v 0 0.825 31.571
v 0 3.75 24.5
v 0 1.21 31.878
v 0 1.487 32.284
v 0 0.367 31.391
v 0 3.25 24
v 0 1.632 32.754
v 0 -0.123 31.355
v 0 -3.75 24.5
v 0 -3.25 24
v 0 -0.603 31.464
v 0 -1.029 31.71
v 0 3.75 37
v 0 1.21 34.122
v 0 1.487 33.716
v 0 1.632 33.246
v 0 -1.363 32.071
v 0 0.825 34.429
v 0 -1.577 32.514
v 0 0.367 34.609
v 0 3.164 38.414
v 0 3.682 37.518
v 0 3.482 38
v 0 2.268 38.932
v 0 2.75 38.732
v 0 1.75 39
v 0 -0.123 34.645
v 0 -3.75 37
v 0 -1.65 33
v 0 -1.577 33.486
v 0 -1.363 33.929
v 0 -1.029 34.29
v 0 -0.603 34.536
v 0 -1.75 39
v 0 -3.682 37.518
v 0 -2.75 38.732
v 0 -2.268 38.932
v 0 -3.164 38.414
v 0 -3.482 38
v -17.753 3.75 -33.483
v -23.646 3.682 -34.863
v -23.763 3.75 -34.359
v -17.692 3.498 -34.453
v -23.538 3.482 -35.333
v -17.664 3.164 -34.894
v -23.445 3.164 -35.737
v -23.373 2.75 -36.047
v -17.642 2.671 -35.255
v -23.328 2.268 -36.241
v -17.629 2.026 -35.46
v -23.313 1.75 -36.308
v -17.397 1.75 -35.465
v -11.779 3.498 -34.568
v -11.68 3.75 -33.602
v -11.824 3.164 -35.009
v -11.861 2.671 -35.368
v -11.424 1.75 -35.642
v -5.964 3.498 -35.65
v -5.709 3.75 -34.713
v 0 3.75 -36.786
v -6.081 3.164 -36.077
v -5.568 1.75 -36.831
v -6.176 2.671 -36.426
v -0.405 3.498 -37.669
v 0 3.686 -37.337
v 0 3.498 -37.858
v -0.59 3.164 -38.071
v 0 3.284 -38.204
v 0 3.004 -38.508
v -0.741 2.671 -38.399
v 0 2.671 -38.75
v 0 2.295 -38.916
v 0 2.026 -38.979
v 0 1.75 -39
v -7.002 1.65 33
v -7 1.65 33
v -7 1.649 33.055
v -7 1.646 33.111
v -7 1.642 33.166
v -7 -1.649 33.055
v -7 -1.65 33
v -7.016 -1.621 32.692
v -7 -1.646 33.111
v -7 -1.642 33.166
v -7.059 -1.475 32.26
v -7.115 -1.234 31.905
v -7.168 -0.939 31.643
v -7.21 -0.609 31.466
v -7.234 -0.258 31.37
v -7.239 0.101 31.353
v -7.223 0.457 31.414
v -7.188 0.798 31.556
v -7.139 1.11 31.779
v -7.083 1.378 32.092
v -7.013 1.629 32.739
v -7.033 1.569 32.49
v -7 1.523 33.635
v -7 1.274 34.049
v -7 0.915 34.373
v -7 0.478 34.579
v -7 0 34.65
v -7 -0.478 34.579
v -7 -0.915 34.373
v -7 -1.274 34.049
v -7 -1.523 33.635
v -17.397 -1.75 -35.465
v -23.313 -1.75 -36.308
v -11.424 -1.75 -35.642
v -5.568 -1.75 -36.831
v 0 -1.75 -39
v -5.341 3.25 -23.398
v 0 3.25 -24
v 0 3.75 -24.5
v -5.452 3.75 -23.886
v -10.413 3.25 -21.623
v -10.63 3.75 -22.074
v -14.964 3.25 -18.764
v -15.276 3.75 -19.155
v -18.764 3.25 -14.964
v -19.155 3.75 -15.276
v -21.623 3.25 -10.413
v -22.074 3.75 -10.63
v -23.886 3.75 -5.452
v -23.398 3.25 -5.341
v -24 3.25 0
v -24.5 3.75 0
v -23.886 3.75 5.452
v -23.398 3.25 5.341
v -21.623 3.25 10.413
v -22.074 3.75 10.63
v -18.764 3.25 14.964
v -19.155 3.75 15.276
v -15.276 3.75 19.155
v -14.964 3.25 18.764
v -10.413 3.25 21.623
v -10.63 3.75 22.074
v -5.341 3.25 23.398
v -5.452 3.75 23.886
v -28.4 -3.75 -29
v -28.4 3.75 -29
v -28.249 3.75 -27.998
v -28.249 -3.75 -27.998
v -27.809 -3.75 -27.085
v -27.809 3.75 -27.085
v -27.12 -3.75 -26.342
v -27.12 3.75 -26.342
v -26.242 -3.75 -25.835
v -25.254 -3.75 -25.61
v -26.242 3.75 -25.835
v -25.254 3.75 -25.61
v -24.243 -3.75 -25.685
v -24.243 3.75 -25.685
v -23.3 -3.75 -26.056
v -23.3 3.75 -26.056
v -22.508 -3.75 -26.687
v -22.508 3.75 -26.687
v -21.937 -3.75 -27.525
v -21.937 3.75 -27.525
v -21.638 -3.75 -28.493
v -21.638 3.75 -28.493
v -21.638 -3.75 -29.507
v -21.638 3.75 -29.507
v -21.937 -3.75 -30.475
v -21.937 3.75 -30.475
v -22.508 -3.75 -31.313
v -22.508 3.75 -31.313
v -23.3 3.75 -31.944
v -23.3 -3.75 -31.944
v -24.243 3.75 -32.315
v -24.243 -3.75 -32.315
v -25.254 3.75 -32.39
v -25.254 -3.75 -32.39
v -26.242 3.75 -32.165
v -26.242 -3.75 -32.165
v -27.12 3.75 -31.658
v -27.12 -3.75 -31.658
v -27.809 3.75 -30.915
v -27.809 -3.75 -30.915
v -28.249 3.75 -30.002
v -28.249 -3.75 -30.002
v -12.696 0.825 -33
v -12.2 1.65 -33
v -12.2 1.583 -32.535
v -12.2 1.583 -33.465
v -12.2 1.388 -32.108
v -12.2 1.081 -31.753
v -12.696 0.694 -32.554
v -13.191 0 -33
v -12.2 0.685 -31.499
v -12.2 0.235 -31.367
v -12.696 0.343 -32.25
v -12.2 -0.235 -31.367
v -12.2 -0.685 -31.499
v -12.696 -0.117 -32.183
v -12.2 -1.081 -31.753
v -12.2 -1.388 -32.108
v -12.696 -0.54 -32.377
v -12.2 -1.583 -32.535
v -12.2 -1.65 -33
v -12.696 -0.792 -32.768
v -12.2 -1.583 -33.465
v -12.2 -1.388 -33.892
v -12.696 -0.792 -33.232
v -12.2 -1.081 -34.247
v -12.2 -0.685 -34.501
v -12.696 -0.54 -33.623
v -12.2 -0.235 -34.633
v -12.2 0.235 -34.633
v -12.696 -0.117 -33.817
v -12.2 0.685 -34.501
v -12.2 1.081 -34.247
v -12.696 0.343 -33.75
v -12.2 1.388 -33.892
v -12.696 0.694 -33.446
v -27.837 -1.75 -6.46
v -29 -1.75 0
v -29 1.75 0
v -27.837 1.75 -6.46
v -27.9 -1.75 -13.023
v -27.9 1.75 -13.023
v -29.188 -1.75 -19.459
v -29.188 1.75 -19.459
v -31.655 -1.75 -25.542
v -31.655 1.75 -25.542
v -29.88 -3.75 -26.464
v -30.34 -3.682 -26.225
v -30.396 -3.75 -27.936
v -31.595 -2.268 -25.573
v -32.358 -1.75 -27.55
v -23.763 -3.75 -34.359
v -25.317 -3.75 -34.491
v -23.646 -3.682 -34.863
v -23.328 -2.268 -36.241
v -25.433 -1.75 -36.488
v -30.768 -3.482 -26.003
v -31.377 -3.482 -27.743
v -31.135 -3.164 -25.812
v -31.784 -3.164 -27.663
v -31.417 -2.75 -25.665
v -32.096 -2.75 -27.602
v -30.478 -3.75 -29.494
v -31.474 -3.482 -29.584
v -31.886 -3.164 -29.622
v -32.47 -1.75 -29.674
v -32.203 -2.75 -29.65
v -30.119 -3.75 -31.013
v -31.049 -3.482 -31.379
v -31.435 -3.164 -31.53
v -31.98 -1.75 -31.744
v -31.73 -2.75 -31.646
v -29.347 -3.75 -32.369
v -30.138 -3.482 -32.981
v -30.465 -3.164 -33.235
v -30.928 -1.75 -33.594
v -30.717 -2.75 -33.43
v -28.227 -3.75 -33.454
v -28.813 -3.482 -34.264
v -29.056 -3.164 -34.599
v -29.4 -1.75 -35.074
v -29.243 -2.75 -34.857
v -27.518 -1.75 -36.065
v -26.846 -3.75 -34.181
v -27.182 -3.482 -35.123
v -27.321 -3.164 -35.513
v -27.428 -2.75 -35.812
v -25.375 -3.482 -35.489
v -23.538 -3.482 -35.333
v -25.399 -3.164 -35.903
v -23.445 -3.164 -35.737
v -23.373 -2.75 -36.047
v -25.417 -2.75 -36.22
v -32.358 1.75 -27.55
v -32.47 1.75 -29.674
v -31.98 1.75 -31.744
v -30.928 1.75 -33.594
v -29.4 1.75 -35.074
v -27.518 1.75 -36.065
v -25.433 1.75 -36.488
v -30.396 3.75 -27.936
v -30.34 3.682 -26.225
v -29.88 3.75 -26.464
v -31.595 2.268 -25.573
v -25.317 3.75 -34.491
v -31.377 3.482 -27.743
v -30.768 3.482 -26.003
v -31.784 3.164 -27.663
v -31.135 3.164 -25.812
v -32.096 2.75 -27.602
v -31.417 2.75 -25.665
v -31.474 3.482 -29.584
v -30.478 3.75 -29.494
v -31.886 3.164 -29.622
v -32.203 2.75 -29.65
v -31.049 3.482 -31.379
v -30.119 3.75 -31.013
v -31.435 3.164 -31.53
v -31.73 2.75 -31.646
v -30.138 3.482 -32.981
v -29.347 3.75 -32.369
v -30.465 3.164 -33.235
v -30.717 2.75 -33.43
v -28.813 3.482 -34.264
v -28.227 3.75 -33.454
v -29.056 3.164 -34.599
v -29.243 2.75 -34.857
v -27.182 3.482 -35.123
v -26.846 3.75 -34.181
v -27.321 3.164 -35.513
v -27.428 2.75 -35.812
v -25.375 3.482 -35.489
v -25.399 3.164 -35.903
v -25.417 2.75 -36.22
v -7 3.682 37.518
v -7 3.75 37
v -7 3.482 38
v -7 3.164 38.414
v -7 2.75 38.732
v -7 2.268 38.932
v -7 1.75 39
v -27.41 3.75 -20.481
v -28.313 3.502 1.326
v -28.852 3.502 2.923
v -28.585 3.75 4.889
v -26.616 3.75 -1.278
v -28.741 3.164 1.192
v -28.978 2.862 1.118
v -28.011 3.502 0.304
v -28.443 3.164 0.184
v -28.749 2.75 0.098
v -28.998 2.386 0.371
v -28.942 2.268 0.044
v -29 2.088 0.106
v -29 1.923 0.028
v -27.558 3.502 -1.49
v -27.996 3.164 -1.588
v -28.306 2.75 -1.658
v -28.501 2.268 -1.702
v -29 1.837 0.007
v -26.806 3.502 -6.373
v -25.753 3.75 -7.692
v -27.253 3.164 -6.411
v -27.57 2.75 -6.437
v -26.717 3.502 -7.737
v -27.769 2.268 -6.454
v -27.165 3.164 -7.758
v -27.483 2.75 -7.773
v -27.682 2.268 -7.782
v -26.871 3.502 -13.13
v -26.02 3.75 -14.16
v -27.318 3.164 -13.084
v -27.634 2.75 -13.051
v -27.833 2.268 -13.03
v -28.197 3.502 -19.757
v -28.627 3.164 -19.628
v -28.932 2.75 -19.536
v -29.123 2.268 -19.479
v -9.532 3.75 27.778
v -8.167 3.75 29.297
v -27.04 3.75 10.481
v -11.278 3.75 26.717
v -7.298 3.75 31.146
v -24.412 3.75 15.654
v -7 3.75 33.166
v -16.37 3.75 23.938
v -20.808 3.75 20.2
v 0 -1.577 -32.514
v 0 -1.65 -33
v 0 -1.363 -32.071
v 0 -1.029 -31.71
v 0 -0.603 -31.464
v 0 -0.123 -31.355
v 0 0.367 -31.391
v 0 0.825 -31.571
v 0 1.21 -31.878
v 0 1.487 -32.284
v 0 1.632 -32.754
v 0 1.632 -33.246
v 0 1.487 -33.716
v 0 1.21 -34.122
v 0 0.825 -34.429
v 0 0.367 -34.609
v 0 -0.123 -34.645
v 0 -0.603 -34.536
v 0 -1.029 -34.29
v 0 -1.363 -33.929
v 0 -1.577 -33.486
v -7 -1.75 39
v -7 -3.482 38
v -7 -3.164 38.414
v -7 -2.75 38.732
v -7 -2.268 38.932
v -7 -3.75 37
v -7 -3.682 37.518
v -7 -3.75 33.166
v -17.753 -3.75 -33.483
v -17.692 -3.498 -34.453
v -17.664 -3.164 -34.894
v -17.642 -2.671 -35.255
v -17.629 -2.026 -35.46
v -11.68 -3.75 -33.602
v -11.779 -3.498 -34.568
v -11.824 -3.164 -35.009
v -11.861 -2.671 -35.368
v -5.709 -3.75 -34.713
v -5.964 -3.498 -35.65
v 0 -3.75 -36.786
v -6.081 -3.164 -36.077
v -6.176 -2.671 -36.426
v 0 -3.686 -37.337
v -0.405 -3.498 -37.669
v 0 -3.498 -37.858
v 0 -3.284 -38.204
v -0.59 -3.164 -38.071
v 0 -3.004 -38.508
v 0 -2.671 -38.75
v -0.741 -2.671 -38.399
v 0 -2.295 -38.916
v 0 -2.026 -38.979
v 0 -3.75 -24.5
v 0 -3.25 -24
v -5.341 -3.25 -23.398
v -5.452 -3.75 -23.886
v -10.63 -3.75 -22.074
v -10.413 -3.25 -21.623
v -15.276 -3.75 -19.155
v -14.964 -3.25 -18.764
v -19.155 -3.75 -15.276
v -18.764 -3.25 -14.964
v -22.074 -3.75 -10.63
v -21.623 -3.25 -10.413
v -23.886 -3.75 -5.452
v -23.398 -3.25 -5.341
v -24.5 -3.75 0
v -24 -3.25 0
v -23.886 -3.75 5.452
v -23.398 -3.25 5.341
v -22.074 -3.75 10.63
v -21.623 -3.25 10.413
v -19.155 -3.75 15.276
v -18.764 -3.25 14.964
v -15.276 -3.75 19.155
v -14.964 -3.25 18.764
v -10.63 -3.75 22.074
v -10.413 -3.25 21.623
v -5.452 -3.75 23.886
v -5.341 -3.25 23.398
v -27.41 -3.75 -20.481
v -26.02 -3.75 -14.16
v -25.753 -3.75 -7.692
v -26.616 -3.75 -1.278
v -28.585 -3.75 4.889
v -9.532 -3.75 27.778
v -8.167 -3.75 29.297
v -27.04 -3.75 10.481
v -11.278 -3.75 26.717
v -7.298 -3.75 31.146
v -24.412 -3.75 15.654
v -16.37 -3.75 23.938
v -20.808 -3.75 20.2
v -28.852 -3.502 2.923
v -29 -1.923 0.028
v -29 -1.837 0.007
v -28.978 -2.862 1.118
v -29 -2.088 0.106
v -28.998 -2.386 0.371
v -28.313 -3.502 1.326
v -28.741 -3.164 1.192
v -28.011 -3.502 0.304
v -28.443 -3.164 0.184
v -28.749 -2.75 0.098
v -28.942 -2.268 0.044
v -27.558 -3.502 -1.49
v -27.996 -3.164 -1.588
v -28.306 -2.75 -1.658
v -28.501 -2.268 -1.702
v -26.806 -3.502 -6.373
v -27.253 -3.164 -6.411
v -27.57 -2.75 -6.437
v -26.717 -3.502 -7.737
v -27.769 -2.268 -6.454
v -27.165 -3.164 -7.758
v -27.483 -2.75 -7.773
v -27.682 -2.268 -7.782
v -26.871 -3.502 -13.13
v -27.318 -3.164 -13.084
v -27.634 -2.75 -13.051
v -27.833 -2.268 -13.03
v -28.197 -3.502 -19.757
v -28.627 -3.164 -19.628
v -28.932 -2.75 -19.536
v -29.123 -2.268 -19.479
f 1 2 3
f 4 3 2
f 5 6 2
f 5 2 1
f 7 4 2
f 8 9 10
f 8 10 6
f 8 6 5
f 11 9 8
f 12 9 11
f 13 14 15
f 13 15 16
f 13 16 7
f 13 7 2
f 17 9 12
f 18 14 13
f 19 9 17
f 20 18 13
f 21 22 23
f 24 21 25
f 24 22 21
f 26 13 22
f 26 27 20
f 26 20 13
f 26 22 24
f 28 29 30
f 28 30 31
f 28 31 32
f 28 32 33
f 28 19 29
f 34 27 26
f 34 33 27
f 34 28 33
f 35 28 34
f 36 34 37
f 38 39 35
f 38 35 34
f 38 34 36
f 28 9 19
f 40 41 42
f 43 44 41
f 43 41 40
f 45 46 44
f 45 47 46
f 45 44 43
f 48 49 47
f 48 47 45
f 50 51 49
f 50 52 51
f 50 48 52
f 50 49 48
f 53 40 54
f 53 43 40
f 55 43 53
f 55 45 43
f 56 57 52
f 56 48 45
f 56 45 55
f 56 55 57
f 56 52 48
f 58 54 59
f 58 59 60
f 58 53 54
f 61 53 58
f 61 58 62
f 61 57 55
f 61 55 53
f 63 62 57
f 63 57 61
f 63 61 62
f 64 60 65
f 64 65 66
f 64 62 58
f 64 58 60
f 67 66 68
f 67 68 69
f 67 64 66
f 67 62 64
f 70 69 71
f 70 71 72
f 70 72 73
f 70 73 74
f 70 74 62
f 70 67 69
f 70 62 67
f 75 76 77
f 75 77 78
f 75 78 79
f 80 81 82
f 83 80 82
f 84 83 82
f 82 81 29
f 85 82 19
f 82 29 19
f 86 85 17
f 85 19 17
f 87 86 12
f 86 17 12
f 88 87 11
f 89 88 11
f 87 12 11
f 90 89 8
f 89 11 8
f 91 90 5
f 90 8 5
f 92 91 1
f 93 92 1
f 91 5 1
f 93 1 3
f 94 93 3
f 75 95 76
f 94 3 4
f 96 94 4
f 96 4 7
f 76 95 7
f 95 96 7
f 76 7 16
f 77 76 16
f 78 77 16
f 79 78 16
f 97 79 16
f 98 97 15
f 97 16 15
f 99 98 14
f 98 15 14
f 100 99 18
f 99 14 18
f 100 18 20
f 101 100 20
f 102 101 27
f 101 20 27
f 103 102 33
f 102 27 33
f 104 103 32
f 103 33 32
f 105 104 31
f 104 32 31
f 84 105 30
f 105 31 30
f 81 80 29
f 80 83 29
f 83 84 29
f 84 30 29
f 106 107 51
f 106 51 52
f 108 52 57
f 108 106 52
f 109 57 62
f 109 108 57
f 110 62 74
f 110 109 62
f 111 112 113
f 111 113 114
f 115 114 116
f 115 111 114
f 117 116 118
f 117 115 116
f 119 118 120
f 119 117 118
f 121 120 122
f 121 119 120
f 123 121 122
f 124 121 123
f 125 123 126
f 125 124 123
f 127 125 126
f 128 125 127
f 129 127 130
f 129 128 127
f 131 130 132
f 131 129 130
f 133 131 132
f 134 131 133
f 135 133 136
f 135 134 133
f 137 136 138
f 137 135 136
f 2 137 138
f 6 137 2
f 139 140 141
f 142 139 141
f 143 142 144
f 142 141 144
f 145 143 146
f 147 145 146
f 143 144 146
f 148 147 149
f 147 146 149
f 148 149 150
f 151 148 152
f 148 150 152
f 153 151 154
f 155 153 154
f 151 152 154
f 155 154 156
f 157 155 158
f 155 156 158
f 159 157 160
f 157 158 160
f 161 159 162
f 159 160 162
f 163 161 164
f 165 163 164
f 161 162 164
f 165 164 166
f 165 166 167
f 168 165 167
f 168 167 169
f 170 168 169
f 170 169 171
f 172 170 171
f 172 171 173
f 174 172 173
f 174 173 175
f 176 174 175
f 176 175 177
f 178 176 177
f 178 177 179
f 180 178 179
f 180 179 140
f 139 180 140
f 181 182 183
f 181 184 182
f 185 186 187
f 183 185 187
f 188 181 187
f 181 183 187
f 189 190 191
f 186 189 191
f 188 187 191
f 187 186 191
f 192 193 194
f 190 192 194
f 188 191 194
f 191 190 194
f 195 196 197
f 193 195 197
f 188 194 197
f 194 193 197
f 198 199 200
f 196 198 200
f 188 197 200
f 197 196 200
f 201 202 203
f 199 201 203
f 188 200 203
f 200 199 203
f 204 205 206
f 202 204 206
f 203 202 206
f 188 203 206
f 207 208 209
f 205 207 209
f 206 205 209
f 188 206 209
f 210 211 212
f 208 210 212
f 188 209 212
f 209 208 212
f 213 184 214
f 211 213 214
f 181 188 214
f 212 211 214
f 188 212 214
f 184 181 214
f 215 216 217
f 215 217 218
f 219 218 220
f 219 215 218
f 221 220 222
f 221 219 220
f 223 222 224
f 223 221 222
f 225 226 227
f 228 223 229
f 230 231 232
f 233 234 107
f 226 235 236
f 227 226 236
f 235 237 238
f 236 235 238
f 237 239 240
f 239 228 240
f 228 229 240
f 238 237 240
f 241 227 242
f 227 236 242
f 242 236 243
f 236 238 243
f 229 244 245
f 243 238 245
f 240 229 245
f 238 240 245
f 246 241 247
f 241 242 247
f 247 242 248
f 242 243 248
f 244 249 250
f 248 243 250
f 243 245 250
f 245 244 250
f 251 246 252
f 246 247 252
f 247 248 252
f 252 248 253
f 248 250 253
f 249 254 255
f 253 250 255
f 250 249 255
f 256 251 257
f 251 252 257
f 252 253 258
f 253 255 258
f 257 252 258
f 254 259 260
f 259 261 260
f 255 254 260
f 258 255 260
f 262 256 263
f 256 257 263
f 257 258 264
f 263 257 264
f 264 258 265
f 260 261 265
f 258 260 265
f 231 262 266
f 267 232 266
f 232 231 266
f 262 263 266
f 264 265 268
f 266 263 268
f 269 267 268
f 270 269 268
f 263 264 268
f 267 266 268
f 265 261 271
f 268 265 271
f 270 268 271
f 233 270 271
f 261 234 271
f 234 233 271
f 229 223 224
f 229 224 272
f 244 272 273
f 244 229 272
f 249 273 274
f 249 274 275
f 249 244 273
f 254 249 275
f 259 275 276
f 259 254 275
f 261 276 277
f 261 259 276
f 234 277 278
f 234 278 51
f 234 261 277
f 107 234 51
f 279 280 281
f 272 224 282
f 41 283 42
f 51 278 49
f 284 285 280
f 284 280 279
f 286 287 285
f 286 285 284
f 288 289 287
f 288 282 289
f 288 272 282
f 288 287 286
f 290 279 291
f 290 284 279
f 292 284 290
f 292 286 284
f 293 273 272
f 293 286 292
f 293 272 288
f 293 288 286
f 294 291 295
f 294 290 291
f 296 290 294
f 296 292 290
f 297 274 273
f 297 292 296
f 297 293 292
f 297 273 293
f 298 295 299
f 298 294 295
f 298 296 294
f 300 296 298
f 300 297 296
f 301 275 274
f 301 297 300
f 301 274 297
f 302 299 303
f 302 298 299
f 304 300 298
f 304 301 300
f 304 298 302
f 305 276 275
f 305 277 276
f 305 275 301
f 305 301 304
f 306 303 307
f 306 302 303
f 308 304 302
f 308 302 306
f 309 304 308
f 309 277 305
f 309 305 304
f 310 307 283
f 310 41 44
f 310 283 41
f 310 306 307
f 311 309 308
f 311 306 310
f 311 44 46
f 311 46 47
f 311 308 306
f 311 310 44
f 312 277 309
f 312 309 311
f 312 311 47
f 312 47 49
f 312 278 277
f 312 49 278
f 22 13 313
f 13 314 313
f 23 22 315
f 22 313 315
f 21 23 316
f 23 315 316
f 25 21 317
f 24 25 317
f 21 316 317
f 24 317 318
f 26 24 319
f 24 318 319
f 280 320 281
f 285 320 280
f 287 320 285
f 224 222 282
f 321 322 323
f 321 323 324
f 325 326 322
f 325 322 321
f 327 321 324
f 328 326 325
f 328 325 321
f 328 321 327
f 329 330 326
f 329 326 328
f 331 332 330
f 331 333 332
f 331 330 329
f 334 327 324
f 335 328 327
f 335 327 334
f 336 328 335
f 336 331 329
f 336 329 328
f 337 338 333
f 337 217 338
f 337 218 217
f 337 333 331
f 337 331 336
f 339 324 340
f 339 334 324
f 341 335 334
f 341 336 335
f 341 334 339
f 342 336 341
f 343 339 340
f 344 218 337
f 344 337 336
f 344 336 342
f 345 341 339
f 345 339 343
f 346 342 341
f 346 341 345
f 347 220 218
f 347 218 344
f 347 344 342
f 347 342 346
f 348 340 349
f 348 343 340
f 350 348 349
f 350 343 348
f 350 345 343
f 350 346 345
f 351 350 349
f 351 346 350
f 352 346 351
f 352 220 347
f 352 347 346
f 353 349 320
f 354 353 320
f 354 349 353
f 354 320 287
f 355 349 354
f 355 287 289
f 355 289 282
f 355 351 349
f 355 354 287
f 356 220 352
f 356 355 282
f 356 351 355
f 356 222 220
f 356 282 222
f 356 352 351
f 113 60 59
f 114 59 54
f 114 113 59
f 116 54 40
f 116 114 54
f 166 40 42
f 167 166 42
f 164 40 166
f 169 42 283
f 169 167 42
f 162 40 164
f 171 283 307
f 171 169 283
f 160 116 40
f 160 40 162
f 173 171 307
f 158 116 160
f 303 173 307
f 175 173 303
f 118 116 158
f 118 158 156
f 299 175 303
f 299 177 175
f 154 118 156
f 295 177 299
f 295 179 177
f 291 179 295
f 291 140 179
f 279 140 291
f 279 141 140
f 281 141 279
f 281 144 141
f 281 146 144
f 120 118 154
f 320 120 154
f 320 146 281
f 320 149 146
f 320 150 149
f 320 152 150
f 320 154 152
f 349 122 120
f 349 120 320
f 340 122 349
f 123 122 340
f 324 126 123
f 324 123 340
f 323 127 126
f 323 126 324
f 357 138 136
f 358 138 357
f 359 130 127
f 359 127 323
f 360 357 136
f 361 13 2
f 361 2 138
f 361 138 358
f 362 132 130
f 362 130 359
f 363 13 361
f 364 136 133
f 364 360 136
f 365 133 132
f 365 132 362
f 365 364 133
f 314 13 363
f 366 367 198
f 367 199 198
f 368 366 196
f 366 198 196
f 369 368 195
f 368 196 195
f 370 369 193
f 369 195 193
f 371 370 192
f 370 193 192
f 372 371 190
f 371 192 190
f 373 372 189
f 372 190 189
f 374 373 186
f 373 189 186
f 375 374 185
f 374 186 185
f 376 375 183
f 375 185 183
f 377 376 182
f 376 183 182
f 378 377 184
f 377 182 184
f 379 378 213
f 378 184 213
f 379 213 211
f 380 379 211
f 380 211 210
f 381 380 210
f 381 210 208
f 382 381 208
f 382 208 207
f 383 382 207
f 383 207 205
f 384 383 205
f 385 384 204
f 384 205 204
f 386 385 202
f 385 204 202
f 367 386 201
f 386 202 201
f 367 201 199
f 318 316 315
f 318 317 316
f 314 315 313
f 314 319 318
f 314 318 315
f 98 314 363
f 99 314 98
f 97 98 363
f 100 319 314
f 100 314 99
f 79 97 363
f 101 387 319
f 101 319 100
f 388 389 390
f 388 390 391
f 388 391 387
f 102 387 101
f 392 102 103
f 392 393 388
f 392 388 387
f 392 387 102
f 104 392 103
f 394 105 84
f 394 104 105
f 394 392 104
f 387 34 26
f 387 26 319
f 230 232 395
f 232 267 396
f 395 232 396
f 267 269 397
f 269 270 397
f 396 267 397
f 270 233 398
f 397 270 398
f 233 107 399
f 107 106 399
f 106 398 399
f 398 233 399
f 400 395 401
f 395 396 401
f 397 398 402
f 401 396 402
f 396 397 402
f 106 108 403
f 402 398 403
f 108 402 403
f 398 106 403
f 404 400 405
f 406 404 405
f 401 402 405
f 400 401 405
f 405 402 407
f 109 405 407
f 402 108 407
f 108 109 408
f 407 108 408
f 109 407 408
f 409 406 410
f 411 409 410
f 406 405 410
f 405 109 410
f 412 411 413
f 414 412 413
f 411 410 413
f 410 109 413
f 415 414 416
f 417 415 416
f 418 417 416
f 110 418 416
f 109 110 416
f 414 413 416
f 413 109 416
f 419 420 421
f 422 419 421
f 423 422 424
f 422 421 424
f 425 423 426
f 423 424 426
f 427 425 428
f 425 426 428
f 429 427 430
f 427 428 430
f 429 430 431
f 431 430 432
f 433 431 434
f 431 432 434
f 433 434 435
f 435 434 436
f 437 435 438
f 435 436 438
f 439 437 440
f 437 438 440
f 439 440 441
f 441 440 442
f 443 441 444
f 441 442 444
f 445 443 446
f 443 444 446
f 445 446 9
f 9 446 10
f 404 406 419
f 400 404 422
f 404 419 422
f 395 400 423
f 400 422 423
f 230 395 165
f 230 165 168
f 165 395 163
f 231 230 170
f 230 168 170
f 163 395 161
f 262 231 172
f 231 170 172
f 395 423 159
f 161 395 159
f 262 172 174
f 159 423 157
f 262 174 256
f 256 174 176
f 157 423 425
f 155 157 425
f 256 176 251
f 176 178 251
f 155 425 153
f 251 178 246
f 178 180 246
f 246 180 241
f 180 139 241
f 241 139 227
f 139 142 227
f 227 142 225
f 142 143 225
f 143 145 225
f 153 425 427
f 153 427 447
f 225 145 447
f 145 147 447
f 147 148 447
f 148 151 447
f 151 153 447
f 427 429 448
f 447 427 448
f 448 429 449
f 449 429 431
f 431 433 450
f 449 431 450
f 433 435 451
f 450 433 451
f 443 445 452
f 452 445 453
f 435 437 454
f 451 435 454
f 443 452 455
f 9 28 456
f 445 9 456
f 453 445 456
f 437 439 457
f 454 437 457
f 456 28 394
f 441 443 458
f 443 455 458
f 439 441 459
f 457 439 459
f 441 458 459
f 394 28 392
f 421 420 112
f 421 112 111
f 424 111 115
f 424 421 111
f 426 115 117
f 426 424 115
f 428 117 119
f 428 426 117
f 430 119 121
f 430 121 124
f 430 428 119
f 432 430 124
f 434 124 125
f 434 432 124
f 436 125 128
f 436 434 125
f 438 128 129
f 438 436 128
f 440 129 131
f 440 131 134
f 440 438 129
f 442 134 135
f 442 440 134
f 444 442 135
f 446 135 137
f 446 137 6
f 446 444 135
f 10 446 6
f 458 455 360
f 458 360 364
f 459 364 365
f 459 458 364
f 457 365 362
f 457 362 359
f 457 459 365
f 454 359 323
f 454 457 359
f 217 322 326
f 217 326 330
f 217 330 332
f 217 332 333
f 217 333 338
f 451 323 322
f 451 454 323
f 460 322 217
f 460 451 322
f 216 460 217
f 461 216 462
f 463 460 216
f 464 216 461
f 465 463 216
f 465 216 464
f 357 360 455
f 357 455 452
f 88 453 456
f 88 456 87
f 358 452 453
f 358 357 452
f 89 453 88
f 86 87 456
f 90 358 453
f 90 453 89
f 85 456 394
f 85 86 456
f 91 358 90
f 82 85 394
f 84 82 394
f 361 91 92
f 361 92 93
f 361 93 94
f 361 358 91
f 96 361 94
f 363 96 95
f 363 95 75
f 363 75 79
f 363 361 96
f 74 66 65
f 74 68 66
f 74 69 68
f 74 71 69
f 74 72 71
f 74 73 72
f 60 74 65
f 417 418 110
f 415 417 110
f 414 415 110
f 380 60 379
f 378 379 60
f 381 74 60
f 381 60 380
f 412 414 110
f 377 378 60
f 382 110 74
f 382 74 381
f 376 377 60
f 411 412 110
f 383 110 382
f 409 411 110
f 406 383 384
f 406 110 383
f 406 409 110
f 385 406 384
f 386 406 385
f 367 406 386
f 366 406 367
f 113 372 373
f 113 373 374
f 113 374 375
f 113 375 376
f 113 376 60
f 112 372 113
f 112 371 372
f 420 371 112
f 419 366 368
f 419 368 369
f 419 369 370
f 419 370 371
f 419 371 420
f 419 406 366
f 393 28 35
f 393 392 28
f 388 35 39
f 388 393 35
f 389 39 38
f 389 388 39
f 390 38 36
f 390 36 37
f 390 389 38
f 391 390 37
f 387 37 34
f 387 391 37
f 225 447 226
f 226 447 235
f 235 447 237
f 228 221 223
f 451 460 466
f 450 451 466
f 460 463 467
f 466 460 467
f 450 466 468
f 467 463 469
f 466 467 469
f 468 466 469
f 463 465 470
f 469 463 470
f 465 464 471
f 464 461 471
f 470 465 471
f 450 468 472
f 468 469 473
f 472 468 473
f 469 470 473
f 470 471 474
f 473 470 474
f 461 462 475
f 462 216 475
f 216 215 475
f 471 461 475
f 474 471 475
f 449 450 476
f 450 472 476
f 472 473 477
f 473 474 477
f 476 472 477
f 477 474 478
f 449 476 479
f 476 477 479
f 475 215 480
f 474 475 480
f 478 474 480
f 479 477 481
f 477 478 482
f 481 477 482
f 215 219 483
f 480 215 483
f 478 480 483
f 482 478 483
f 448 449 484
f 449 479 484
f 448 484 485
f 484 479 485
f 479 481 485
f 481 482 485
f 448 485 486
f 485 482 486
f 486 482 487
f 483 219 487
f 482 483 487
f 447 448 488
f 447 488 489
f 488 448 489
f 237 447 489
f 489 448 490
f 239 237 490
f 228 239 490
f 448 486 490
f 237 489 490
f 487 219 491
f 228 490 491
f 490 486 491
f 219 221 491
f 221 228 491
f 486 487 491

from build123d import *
from build123d import SkipClean  # not in build123d's __all__

# Parameters (mm, degrees)
F1_DEPTH    = 3.75
F3_D        = 3.3
F3_DEPTH    = 12.2
F3_TIP      = 0.9914200214
F4_R        = 2
F5_T4_DEPTH = 7.5
F5_S5_R     = 1.65
F5_T6_DEPTH = 7
F6_SIZE     = 0.5
F8_D        = 6.8


# Not quite as in the source:
# - a fillet or chamfer that OpenCascade refuses, or shapes differently, is made with other operations: its cross-section is extruded or revolved along the edge and cut away or added
# - a feature names something its author has since deleted; it is built from what else it names


with BuildPart() as f1:
    # F0 (on Front) → F1 (new body, symmetric)
    with BuildSketch(Plane.XZ):
        with BuildLine():
            ThreePointArc((0, -24), (-24, 0), (0, 24))
            Line((0, 24), (0, 39))
            Line((0, 39), (-7, 39))
            Line((-7, 39), (-7, 28.1424945589))
            ThreePointArc((-7, 28.1424945589), (-22.8473193176, 17.8605710995), (-29, 0))
            ThreePointArc((-29, 0), (-27.9004726433, -13.0232858743), (-31.6552133192, -25.541946259))
            ThreePointArc((-31.6552133192, -25.541946259), (-30.9284075442, -33.5939072683), (-23.3128108861, -36.3077625094))
            ThreePointArc((-23.3128108861, -36.3077625094), (-11.4240360348, -35.6417318474), (0, -39))
            Line((0, -39), (0, -24))
        make_face()
    extrude(amount=F1_DEPTH, both=True)

    # F3
    with Locations(Plane.YZ):
        with Locations((0, 33), (0, -33)):
            Hole(F3_D / 2, depth=F3_DEPTH)
            with Locations((0, 0, -(F3_DEPTH + F3_TIP / 2))):  # 118° drill point
                Cone(0, F3_D / 2, F3_TIP, mode=Mode.SUBTRACT)

    # F4
    f4_edges = [f1.edges().sort_by_distance(p)[0] for p in [
        (-3.5, 3.75, 39),
        (-3.5, -3.75, 39),
        (-11.424036, 3.75, -35.641732),
        (-11.424036, -3.75, -35.641732),
    ]]
    fillet(f4_edges, radius=F4_R)

    # F5: fillet of radius 7 on 1 edges, made by hand


with BuildPart() as f5_tool2:
    # F5_s3 → F5_t4 (new body)
    with BuildSketch(Plane.XZ.offset(-3.75)):
        with BuildLine():
            ThreePointArc((-11.2777777778, 26.7172552556), (-8.1666666667, 29.2968523148), (-7, 33.1662479036))
            Line((-7, 33.1662479036), (-7, 28.1424945589))
            ThreePointArc((-7, 28.1424945589), (-9.1666306182, 27.5131401899), (-11.2777777778, 26.7172552556))
        make_face()
    extrude(amount=F5_T4_DEPTH)

    # F5_s5 → F5_t6 (cut, symmetric)
    with BuildSketch(Plane.YZ.offset(-9.1)):
        with Locations((0, 33)):
            Circle(F5_S5_R)
    with SkipClean():  # cleaning this boolean's faces spoils the solid; the shape is the same uncleaned
        extrude(amount=F5_T6_DEPTH, both=True, mode=Mode.SUBTRACT)


with BuildPart() as f1_1:
    add(f1.part, clean=False)

    # F5_t1: union F5_tool2
    add(f5_tool2.part)

    # F6
    f6_edges = [f1_1.edges().sort_by_distance(p)[0] for p in [
        (-24, 3.75, 0),
        (-24, -3.75, 0),
    ]]
    chamfer(f6_edges, length=F6_SIZE)

    # F8 (through all)
    with Locations(Plane.XZ.offset(3.75)):
        with Locations((-25, -29)):
            Hole(F8_D / 2)


solid = f1_1.part
